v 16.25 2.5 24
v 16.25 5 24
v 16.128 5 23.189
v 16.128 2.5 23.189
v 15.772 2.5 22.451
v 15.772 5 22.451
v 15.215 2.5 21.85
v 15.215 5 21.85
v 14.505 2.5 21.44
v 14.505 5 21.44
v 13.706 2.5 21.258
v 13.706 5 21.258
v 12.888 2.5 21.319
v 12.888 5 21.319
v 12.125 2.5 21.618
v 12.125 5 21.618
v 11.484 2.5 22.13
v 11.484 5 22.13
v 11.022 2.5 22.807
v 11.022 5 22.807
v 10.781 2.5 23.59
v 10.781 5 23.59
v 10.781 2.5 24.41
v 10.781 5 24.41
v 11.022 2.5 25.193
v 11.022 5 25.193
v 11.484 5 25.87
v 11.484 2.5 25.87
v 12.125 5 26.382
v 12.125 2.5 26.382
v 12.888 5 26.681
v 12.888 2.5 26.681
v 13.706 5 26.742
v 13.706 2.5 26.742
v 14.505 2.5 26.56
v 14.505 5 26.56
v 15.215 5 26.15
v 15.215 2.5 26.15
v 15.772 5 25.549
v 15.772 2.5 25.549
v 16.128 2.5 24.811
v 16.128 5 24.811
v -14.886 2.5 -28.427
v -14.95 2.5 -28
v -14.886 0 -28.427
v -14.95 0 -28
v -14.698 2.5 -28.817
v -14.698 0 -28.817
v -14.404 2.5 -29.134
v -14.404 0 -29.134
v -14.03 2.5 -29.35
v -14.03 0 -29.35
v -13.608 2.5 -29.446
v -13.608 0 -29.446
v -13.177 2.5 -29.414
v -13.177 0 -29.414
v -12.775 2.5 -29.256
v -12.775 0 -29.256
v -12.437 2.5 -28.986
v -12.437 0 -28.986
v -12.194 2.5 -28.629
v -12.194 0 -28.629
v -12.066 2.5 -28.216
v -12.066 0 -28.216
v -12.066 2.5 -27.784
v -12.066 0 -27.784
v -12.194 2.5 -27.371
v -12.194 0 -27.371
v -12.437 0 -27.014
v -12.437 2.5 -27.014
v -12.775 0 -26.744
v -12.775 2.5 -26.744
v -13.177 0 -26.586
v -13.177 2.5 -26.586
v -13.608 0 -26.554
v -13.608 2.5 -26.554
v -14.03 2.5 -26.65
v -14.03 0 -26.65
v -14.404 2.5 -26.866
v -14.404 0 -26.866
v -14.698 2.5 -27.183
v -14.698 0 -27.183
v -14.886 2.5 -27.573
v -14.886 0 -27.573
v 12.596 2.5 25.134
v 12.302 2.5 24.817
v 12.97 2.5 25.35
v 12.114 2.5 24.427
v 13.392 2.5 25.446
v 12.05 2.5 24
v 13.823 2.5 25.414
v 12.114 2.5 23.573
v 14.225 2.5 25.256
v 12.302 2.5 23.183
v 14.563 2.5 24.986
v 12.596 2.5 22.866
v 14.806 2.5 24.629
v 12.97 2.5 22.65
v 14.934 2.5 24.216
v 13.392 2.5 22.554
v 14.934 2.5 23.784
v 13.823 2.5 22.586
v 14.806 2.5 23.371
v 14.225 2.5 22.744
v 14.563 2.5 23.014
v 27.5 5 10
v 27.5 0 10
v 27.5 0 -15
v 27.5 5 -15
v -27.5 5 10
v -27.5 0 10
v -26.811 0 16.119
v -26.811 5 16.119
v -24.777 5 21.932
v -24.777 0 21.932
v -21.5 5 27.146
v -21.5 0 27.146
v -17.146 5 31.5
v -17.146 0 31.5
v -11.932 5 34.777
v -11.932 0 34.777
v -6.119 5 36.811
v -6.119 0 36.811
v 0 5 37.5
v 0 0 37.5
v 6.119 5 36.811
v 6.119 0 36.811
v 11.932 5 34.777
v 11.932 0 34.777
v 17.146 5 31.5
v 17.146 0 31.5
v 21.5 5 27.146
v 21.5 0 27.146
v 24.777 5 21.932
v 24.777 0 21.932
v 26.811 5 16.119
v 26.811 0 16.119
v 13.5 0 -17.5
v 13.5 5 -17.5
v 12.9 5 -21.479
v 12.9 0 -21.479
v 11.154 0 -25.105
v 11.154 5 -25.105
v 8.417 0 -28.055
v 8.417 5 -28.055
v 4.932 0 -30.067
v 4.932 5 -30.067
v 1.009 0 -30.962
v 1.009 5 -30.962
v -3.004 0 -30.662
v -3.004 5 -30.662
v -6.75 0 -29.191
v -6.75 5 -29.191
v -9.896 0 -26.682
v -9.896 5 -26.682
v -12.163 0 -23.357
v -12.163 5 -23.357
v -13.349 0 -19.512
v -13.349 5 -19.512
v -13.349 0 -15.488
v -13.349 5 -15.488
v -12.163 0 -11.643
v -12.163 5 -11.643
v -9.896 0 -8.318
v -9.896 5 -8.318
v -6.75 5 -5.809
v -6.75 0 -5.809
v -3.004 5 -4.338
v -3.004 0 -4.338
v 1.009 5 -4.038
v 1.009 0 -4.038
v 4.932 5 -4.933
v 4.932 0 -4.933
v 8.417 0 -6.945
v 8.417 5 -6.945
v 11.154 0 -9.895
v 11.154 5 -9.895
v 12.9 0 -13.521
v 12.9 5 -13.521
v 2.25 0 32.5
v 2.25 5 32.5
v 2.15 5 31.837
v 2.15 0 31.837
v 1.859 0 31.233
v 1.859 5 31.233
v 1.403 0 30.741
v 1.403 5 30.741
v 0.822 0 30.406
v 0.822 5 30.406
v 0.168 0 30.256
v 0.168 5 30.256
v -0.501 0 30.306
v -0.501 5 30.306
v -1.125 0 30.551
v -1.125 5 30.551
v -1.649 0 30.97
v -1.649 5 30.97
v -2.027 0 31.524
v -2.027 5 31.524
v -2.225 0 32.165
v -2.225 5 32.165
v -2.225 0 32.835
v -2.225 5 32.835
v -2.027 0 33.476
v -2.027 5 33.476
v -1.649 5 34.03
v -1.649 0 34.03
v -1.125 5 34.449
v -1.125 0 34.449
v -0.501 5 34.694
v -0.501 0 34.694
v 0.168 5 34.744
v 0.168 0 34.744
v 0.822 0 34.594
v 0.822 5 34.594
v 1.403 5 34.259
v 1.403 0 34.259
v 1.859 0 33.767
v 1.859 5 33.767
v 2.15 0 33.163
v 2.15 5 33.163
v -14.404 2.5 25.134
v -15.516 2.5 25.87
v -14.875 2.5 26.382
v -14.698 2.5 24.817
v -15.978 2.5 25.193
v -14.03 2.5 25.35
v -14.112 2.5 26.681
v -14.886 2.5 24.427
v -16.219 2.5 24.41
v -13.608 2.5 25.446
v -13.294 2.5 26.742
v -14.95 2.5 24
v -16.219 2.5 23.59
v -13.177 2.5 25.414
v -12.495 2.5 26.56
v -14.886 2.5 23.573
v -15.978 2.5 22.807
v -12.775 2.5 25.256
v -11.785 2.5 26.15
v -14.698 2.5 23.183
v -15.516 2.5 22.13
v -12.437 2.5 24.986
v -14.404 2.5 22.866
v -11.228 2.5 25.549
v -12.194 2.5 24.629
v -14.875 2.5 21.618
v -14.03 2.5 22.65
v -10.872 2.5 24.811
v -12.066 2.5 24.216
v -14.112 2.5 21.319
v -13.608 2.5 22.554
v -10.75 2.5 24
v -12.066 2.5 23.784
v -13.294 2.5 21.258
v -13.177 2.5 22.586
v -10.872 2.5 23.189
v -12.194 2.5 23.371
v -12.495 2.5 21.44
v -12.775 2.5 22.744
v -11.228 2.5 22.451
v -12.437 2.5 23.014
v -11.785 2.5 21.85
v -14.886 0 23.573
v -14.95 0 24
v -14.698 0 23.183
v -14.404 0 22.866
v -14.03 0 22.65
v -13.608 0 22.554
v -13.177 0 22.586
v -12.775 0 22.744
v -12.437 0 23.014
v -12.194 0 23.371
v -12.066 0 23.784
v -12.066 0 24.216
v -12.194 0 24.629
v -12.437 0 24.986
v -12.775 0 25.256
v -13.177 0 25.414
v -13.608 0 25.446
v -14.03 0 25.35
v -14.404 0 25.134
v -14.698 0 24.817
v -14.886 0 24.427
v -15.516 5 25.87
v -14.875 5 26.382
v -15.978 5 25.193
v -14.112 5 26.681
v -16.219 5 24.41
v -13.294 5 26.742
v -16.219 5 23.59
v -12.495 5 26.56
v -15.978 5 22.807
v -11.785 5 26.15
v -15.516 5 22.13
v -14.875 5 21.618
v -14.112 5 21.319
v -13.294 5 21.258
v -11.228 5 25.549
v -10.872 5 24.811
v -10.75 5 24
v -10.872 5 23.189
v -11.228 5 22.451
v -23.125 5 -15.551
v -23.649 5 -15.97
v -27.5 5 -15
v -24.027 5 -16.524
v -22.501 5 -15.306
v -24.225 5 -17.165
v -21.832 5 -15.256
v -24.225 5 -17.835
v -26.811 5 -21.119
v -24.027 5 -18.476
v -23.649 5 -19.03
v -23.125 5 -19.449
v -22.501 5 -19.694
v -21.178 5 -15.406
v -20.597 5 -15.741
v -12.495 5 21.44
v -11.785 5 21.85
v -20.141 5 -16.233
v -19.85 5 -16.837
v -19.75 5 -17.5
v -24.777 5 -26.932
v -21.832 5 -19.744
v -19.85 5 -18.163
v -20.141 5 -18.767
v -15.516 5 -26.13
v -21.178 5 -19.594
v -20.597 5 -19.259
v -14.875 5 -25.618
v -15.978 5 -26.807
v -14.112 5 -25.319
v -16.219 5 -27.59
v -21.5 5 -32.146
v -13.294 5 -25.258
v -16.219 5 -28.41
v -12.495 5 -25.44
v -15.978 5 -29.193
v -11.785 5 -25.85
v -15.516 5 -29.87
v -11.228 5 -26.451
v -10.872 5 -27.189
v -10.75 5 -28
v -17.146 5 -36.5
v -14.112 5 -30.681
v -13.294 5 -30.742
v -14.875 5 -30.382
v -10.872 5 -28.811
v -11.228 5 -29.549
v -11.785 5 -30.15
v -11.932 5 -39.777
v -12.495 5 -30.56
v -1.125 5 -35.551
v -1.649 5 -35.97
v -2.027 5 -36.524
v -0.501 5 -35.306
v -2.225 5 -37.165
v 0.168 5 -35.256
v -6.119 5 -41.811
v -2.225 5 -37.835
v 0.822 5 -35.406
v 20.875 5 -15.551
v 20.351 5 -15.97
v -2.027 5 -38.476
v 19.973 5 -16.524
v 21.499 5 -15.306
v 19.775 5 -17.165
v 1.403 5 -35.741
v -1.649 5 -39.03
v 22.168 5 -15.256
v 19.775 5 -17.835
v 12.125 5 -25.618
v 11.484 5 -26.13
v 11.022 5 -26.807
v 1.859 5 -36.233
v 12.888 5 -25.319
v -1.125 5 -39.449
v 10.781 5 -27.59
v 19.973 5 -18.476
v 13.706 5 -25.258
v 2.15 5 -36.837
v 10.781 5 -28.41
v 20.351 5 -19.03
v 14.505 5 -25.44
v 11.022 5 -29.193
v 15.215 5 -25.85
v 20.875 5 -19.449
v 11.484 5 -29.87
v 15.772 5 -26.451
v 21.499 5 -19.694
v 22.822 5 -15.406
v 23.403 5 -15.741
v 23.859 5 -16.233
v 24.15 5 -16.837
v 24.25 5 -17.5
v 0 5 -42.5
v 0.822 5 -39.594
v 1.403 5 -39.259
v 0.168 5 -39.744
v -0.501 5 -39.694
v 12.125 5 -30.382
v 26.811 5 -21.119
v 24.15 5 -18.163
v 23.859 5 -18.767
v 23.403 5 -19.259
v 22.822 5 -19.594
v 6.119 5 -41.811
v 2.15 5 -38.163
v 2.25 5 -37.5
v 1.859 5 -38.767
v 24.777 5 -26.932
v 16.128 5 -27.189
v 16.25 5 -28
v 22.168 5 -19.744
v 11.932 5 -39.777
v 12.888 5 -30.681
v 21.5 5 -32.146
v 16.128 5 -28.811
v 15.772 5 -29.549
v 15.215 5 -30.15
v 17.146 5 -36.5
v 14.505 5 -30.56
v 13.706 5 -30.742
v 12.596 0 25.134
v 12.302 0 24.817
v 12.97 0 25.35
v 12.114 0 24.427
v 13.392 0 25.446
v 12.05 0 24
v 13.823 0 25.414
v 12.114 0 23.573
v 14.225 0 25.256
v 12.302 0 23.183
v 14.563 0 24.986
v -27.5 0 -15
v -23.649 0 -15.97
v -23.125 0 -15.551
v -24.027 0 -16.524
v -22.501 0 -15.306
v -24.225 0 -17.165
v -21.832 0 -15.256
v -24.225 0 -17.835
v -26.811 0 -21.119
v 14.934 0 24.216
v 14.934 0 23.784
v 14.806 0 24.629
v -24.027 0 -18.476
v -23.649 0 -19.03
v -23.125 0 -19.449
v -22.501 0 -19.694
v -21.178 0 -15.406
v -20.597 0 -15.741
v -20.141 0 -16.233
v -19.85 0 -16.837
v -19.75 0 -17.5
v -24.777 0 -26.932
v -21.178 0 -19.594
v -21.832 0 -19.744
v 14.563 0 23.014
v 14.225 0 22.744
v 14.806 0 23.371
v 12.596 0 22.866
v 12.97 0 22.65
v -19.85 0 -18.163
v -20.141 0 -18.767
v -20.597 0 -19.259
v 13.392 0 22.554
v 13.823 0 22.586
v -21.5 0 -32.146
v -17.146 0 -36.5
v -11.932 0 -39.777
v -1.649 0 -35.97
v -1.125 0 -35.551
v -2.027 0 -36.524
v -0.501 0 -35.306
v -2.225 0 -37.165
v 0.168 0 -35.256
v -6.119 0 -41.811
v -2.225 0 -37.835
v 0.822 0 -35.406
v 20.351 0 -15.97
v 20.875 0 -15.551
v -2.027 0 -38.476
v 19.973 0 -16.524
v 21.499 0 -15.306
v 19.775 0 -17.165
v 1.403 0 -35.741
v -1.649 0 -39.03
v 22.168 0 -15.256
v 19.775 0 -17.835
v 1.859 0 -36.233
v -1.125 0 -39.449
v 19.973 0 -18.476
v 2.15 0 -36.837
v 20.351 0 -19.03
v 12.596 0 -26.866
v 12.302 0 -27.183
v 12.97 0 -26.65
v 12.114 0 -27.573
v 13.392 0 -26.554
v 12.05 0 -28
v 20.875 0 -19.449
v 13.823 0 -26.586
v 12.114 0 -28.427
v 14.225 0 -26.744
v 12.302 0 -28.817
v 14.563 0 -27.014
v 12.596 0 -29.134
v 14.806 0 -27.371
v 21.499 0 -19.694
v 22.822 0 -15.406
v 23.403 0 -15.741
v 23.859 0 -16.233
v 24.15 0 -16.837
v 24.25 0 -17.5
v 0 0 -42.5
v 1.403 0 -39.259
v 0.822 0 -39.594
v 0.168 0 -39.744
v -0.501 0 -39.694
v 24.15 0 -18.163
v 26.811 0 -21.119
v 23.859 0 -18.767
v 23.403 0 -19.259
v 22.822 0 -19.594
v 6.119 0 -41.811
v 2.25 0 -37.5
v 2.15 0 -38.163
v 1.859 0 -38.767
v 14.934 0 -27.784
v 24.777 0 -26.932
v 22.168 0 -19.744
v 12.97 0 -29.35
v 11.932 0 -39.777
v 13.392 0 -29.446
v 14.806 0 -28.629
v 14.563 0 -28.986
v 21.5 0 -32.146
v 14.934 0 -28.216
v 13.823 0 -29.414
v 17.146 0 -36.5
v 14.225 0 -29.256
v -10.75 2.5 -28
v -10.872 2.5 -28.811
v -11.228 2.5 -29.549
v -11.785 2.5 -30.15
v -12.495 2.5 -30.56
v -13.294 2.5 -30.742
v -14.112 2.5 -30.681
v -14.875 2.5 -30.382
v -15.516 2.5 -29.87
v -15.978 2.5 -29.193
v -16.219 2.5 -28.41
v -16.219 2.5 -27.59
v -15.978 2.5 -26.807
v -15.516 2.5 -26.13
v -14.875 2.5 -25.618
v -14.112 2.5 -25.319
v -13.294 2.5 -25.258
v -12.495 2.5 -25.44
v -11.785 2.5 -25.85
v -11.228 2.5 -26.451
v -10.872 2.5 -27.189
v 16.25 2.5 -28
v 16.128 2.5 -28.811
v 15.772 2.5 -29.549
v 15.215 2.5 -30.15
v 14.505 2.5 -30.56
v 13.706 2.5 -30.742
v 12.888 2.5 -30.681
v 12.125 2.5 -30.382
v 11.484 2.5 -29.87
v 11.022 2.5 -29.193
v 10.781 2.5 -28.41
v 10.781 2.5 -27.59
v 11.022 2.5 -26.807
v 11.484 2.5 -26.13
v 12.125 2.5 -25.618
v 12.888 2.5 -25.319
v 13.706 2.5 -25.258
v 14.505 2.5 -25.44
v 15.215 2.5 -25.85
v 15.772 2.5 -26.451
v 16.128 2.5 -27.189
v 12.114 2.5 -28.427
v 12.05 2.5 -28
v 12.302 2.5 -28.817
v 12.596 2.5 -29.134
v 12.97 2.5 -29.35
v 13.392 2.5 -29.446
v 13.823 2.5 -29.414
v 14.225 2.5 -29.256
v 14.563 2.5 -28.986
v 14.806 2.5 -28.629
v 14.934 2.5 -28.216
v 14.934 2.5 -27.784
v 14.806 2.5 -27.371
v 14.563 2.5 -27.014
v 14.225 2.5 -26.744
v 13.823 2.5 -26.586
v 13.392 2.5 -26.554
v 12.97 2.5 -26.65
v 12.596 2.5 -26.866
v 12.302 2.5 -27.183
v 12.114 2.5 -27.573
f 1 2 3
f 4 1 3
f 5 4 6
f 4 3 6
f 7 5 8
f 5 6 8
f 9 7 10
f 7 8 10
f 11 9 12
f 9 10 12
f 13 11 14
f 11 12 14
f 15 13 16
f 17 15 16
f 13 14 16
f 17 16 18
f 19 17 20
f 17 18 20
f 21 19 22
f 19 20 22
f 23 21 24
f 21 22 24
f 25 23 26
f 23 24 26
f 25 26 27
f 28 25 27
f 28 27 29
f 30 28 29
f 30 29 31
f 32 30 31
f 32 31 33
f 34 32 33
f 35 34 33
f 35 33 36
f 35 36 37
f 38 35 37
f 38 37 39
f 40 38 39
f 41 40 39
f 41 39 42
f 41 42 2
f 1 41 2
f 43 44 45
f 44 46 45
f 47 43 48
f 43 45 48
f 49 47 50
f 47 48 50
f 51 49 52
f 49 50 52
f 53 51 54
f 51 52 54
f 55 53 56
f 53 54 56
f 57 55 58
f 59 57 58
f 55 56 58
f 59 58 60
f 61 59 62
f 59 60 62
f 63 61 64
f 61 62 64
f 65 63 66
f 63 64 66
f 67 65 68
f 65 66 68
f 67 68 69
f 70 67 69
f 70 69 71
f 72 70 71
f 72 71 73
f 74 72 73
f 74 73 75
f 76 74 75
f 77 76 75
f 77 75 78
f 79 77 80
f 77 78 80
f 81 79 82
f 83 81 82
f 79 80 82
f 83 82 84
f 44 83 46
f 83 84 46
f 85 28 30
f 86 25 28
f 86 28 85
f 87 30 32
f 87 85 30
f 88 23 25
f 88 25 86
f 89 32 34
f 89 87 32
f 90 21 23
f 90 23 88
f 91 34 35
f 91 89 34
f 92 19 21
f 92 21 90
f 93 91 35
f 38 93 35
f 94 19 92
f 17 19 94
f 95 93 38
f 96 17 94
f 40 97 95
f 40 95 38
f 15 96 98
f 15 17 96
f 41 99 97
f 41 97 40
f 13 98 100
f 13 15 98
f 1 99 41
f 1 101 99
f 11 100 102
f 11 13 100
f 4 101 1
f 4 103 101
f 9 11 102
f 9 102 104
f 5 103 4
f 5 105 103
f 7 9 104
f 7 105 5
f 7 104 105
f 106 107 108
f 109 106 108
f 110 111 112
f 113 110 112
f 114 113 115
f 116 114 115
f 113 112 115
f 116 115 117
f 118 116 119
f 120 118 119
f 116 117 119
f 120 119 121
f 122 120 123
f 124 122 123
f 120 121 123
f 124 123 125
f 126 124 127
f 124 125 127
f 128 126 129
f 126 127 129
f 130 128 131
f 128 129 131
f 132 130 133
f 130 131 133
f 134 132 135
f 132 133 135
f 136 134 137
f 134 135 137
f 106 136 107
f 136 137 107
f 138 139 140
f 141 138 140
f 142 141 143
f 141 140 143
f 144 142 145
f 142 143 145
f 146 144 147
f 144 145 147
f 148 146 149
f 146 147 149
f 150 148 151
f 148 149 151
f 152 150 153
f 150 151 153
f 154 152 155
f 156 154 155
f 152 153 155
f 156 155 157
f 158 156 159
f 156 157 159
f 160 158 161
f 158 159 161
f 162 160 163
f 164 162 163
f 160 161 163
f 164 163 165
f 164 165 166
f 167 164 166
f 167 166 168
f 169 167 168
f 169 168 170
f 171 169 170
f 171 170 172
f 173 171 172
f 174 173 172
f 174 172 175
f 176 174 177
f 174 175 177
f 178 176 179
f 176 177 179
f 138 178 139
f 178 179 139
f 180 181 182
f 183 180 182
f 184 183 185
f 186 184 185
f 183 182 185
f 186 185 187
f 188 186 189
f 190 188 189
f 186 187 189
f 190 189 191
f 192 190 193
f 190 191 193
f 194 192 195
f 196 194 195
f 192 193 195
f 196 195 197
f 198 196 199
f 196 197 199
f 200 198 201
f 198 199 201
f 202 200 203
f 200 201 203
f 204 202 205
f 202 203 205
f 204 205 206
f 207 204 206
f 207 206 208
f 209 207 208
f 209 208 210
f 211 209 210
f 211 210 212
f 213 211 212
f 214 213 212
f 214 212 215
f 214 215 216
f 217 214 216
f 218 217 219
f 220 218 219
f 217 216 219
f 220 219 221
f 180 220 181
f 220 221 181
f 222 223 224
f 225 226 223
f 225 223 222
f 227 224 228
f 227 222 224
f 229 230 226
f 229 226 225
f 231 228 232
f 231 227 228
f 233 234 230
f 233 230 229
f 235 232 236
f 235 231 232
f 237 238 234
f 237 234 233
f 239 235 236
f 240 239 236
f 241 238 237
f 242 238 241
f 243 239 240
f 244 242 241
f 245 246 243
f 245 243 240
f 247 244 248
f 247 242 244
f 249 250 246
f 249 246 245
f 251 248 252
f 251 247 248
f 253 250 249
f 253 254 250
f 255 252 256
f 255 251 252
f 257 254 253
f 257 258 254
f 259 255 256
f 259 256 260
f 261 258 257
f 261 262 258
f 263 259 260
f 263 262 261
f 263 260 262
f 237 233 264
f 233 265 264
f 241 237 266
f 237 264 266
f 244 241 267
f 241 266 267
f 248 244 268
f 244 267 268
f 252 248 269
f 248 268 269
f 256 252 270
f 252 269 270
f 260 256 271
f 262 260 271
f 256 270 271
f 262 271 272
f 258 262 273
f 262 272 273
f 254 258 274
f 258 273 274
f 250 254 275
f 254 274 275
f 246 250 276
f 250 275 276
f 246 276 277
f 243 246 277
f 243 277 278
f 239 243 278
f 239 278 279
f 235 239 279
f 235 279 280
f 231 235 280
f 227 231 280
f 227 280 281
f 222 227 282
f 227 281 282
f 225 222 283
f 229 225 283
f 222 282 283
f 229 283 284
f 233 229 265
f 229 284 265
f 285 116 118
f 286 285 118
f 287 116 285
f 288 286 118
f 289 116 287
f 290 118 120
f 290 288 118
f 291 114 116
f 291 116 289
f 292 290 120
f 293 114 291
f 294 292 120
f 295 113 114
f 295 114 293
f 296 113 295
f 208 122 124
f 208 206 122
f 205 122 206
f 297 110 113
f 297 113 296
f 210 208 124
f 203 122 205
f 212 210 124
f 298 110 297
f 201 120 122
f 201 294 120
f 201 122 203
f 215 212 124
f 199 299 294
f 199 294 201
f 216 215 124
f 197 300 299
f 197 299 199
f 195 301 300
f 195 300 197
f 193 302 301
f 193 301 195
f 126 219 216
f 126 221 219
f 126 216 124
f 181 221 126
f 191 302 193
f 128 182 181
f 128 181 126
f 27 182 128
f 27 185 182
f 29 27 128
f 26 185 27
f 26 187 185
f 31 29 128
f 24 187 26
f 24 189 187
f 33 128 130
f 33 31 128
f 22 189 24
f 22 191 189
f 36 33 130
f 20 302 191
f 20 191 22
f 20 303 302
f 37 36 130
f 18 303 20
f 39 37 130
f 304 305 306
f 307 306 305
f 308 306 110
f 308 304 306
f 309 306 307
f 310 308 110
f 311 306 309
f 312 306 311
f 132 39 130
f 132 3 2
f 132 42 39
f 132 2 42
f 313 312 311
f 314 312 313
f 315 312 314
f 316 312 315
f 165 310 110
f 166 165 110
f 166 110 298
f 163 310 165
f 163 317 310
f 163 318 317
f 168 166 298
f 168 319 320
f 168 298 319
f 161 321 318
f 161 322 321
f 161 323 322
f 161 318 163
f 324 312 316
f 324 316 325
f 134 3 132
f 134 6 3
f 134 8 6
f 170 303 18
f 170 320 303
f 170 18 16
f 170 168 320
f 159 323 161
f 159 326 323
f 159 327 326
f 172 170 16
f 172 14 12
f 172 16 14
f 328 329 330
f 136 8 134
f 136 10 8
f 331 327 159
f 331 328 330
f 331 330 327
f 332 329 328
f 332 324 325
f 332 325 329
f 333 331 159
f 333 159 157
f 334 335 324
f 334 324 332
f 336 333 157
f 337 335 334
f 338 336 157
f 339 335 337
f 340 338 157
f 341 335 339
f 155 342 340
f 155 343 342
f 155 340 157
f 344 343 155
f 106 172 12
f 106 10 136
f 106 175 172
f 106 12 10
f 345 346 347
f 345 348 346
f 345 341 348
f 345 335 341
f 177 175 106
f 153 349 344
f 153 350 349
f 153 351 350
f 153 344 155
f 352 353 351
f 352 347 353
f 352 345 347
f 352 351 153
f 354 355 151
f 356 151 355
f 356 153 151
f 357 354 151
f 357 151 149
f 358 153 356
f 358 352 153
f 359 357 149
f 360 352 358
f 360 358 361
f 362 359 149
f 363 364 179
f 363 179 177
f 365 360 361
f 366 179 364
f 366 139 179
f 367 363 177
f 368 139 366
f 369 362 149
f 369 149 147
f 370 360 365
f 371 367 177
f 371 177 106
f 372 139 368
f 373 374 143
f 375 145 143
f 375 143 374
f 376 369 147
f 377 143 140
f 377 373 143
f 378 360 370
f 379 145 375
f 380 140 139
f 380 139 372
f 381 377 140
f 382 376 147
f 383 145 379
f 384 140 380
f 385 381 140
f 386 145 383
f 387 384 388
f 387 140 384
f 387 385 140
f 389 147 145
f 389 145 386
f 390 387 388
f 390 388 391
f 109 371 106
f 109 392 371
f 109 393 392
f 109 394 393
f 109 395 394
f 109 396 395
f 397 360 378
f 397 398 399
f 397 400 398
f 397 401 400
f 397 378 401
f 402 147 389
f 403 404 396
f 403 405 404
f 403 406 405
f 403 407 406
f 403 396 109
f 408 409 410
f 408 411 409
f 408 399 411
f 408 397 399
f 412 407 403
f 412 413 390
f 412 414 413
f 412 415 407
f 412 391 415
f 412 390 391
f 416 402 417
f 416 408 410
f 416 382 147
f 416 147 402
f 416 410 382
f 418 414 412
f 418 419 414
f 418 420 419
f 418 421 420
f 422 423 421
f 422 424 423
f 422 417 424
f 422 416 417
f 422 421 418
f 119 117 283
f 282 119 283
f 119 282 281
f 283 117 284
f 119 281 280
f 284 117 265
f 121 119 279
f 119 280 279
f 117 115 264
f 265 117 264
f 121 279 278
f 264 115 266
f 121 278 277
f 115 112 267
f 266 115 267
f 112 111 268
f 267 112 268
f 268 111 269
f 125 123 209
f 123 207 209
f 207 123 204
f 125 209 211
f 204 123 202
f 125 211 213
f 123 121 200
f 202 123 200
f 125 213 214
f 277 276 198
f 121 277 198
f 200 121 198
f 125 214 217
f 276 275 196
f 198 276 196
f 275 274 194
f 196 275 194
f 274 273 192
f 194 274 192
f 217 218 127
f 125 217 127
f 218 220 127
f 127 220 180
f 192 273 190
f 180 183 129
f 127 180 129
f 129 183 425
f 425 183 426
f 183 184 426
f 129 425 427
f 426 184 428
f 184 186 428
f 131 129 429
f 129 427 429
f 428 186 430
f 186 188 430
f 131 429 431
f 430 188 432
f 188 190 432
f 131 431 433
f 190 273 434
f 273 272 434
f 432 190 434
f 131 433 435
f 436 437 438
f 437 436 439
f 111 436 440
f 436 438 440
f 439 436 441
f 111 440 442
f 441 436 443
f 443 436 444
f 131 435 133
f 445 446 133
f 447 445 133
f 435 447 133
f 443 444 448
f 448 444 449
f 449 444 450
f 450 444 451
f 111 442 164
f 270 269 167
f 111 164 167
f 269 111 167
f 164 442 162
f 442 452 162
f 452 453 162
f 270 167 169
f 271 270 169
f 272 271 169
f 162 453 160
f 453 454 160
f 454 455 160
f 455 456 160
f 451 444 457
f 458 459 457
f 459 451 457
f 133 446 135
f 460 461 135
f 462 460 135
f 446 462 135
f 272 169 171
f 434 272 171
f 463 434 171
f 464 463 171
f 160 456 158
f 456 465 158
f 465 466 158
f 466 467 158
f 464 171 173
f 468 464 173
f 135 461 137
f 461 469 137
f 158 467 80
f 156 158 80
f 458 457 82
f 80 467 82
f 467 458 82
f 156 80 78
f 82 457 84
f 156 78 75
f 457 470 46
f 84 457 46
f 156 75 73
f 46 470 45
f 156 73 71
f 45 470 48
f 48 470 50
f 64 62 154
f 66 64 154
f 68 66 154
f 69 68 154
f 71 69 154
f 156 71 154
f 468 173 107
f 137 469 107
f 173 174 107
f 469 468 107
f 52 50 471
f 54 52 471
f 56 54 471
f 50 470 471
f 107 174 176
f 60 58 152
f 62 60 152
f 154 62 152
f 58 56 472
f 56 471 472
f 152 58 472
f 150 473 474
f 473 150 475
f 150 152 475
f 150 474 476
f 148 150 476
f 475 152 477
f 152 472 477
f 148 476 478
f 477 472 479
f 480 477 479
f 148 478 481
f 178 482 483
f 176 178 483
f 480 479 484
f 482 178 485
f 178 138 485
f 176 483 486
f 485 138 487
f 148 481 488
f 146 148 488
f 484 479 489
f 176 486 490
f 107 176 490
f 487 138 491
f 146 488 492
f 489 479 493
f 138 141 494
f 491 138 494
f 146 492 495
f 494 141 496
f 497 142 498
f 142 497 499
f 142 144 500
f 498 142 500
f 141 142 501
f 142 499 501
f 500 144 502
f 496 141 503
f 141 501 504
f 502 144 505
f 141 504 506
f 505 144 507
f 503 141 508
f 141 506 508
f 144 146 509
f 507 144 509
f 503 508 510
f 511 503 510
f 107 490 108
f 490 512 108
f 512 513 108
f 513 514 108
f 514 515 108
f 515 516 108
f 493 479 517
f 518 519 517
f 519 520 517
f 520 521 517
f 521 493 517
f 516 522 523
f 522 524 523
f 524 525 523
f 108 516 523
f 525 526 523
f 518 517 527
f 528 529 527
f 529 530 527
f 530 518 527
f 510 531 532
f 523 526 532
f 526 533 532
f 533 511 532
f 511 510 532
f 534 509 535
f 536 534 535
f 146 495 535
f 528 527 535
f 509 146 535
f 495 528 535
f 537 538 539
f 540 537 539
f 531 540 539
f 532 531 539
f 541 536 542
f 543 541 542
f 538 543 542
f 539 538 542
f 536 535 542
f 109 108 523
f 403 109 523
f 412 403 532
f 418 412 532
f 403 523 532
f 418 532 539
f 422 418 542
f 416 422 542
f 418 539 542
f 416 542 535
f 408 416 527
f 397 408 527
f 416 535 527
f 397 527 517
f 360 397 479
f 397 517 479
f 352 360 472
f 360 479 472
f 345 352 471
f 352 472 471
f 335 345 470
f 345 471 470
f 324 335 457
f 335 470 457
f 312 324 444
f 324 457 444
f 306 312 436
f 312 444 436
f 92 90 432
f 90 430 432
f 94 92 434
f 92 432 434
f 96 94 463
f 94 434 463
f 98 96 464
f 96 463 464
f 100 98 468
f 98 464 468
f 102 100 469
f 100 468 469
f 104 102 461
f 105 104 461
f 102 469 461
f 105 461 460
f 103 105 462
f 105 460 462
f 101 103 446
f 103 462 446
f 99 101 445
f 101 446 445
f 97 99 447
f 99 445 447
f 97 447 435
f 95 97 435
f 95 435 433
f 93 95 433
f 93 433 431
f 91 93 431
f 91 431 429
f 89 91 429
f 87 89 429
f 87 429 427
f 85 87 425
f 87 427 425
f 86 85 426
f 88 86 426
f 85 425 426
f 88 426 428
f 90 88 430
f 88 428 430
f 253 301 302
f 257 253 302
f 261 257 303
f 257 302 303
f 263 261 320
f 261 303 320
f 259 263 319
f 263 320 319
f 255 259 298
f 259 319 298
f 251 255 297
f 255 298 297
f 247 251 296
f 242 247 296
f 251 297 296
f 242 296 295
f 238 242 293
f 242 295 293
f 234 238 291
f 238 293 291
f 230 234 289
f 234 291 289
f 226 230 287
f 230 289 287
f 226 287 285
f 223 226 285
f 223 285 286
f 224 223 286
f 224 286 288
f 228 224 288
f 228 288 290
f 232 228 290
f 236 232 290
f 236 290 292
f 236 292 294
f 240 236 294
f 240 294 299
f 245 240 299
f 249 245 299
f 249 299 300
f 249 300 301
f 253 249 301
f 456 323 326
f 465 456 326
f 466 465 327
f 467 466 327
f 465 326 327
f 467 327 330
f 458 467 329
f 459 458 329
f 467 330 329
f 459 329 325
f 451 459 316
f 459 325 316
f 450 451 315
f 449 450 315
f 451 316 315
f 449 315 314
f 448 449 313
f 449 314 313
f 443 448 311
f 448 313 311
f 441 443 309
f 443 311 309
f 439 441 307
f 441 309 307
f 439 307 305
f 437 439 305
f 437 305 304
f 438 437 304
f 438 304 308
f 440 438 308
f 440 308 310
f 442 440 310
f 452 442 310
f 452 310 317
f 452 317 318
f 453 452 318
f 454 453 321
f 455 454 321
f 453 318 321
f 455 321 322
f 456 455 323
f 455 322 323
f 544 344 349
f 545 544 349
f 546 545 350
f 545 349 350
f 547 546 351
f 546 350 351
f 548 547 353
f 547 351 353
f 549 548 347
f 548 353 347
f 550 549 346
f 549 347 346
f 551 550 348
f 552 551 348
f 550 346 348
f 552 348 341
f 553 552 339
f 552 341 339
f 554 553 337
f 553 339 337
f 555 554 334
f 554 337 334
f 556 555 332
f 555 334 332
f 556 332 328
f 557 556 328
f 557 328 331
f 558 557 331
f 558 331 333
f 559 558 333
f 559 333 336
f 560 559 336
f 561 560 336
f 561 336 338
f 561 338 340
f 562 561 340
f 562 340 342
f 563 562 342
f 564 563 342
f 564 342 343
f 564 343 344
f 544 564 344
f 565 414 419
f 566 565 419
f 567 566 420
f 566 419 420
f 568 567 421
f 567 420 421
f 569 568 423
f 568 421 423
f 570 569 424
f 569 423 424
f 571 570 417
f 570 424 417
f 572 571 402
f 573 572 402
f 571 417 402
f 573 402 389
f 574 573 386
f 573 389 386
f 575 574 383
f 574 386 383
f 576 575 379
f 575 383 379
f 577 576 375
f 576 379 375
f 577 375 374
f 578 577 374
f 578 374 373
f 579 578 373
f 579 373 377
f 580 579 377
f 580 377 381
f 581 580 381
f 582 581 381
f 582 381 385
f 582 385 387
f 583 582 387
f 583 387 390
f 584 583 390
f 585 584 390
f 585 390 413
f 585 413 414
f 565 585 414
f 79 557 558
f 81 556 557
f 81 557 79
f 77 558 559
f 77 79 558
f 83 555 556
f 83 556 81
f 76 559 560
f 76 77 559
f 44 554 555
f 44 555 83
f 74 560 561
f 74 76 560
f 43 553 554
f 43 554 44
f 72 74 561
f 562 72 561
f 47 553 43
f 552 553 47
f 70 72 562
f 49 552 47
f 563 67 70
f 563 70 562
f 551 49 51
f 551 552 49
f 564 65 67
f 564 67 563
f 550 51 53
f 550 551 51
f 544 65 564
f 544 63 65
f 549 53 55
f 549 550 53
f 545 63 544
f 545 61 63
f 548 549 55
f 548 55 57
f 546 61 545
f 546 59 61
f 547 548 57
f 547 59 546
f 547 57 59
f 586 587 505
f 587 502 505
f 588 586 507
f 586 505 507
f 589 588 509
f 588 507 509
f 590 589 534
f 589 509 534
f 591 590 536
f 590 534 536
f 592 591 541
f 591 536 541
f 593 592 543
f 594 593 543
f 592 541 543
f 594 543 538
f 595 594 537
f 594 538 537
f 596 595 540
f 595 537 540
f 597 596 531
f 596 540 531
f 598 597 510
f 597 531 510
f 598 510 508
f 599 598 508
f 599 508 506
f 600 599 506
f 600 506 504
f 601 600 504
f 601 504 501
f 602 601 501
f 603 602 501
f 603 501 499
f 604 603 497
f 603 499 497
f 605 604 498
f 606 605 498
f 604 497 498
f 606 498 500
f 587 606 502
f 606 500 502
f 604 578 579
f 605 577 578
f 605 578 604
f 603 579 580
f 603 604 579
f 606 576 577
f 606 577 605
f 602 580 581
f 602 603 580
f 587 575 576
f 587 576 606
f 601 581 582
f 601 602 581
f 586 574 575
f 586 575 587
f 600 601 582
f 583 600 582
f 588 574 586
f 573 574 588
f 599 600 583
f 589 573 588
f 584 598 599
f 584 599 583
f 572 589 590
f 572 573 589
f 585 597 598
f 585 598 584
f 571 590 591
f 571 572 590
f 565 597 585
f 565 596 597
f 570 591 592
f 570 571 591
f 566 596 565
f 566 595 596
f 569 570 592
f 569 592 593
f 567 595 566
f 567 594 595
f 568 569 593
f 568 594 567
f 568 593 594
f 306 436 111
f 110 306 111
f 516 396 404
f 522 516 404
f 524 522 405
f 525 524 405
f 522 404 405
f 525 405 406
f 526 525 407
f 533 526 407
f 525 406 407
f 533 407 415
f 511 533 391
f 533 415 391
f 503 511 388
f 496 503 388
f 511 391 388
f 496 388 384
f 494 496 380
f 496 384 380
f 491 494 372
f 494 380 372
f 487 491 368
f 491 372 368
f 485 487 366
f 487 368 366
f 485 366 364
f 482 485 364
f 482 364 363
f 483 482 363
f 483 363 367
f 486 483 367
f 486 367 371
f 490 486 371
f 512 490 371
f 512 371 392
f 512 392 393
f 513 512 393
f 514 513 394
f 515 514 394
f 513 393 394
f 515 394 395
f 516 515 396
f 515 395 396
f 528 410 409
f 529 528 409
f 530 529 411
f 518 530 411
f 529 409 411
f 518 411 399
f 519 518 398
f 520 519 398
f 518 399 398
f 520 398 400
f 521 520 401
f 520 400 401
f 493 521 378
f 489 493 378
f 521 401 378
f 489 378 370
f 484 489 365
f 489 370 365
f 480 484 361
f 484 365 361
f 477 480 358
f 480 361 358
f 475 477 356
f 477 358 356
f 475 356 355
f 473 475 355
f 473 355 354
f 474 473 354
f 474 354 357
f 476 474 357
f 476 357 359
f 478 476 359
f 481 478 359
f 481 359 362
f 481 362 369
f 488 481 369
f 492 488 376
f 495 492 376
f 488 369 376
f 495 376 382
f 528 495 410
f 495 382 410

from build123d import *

# Parameters (mm, degrees)
EXTRUDE_1_DEPTH                = 5
SKETCH_2_R                     = 13.5
CUT_EXTRUDE_1_DEPTH            = 5
SKETCH_4_R                     = 2.25
CUT_EXTRUDE_2_DEPTH            = 5
HOLE_WIZARD_M2_5_1_D           = 2.9
HOLE_WIZARD_M2_5_1_CBORE_D     = 5.5
HOLE_WIZARD_M2_5_1_CBORE_DEPTH = 2.5


with BuildPart() as part:
    # 스케치1 → 보스-돌출1 (new body)
    with BuildSketch(Plane(origin=(0, 0, 0), x_dir=(1, 0, 0), z_dir=(0, 1, 0))):
        with BuildLine():
            Line((-27.5, 15), (-27.5, -10))
            ThreePointArc((-27.5, -10), (0, -37.5), (27.5, -10))
            Line((27.5, -10), (27.5, 15))
            ThreePointArc((27.5, 15), (0, 42.5), (-27.5, 15))
        make_face()
    extrude(amount=EXTRUDE_1_DEPTH)

    # 스케치2 → 컷-돌출1 (cut)
    with BuildSketch(Plane(origin=(0, 5, 0), x_dir=(1, 0, 0), z_dir=(0, 1, 0))):
        with Locations((0, 17.5)):
            Circle(SKETCH_2_R)
    extrude(amount=-CUT_EXTRUDE_1_DEPTH, mode=Mode.SUBTRACT)

    # 스케치4 → 컷-돌출2 (cut)
    with BuildSketch(Plane(origin=(0, 5, 0), x_dir=(1, 0, 0), z_dir=(0, 1, 0))):
        with Locations((0, 37.5)):
            Circle(SKETCH_4_R)
        with Locations((0, -32.5)):
            Circle(SKETCH_4_R)
        with Locations((-22, 17.5)):
            Circle(SKETCH_4_R)
        with Locations((22, 17.5)):
            Circle(SKETCH_4_R)
    extrude(amount=-CUT_EXTRUDE_2_DEPTH, mode=Mode.SUBTRACT)

    # M2.5 소켓 머리 캡 나사용 카운터보어1 (through all)
    with Locations(Plane(origin=(0, 5, 0), x_dir=(1, 0, 0), z_dir=(0, 1, 0))):
        with Locations((-13.5, 28), (13.5, 28), (13.5, -24), (-13.5, -24)):
            CounterBoreHole(HOLE_WIZARD_M2_5_1_D / 2, HOLE_WIZARD_M2_5_1_CBORE_D / 2, HOLE_WIZARD_M2_5_1_CBORE_DEPTH)


solid = part.part
